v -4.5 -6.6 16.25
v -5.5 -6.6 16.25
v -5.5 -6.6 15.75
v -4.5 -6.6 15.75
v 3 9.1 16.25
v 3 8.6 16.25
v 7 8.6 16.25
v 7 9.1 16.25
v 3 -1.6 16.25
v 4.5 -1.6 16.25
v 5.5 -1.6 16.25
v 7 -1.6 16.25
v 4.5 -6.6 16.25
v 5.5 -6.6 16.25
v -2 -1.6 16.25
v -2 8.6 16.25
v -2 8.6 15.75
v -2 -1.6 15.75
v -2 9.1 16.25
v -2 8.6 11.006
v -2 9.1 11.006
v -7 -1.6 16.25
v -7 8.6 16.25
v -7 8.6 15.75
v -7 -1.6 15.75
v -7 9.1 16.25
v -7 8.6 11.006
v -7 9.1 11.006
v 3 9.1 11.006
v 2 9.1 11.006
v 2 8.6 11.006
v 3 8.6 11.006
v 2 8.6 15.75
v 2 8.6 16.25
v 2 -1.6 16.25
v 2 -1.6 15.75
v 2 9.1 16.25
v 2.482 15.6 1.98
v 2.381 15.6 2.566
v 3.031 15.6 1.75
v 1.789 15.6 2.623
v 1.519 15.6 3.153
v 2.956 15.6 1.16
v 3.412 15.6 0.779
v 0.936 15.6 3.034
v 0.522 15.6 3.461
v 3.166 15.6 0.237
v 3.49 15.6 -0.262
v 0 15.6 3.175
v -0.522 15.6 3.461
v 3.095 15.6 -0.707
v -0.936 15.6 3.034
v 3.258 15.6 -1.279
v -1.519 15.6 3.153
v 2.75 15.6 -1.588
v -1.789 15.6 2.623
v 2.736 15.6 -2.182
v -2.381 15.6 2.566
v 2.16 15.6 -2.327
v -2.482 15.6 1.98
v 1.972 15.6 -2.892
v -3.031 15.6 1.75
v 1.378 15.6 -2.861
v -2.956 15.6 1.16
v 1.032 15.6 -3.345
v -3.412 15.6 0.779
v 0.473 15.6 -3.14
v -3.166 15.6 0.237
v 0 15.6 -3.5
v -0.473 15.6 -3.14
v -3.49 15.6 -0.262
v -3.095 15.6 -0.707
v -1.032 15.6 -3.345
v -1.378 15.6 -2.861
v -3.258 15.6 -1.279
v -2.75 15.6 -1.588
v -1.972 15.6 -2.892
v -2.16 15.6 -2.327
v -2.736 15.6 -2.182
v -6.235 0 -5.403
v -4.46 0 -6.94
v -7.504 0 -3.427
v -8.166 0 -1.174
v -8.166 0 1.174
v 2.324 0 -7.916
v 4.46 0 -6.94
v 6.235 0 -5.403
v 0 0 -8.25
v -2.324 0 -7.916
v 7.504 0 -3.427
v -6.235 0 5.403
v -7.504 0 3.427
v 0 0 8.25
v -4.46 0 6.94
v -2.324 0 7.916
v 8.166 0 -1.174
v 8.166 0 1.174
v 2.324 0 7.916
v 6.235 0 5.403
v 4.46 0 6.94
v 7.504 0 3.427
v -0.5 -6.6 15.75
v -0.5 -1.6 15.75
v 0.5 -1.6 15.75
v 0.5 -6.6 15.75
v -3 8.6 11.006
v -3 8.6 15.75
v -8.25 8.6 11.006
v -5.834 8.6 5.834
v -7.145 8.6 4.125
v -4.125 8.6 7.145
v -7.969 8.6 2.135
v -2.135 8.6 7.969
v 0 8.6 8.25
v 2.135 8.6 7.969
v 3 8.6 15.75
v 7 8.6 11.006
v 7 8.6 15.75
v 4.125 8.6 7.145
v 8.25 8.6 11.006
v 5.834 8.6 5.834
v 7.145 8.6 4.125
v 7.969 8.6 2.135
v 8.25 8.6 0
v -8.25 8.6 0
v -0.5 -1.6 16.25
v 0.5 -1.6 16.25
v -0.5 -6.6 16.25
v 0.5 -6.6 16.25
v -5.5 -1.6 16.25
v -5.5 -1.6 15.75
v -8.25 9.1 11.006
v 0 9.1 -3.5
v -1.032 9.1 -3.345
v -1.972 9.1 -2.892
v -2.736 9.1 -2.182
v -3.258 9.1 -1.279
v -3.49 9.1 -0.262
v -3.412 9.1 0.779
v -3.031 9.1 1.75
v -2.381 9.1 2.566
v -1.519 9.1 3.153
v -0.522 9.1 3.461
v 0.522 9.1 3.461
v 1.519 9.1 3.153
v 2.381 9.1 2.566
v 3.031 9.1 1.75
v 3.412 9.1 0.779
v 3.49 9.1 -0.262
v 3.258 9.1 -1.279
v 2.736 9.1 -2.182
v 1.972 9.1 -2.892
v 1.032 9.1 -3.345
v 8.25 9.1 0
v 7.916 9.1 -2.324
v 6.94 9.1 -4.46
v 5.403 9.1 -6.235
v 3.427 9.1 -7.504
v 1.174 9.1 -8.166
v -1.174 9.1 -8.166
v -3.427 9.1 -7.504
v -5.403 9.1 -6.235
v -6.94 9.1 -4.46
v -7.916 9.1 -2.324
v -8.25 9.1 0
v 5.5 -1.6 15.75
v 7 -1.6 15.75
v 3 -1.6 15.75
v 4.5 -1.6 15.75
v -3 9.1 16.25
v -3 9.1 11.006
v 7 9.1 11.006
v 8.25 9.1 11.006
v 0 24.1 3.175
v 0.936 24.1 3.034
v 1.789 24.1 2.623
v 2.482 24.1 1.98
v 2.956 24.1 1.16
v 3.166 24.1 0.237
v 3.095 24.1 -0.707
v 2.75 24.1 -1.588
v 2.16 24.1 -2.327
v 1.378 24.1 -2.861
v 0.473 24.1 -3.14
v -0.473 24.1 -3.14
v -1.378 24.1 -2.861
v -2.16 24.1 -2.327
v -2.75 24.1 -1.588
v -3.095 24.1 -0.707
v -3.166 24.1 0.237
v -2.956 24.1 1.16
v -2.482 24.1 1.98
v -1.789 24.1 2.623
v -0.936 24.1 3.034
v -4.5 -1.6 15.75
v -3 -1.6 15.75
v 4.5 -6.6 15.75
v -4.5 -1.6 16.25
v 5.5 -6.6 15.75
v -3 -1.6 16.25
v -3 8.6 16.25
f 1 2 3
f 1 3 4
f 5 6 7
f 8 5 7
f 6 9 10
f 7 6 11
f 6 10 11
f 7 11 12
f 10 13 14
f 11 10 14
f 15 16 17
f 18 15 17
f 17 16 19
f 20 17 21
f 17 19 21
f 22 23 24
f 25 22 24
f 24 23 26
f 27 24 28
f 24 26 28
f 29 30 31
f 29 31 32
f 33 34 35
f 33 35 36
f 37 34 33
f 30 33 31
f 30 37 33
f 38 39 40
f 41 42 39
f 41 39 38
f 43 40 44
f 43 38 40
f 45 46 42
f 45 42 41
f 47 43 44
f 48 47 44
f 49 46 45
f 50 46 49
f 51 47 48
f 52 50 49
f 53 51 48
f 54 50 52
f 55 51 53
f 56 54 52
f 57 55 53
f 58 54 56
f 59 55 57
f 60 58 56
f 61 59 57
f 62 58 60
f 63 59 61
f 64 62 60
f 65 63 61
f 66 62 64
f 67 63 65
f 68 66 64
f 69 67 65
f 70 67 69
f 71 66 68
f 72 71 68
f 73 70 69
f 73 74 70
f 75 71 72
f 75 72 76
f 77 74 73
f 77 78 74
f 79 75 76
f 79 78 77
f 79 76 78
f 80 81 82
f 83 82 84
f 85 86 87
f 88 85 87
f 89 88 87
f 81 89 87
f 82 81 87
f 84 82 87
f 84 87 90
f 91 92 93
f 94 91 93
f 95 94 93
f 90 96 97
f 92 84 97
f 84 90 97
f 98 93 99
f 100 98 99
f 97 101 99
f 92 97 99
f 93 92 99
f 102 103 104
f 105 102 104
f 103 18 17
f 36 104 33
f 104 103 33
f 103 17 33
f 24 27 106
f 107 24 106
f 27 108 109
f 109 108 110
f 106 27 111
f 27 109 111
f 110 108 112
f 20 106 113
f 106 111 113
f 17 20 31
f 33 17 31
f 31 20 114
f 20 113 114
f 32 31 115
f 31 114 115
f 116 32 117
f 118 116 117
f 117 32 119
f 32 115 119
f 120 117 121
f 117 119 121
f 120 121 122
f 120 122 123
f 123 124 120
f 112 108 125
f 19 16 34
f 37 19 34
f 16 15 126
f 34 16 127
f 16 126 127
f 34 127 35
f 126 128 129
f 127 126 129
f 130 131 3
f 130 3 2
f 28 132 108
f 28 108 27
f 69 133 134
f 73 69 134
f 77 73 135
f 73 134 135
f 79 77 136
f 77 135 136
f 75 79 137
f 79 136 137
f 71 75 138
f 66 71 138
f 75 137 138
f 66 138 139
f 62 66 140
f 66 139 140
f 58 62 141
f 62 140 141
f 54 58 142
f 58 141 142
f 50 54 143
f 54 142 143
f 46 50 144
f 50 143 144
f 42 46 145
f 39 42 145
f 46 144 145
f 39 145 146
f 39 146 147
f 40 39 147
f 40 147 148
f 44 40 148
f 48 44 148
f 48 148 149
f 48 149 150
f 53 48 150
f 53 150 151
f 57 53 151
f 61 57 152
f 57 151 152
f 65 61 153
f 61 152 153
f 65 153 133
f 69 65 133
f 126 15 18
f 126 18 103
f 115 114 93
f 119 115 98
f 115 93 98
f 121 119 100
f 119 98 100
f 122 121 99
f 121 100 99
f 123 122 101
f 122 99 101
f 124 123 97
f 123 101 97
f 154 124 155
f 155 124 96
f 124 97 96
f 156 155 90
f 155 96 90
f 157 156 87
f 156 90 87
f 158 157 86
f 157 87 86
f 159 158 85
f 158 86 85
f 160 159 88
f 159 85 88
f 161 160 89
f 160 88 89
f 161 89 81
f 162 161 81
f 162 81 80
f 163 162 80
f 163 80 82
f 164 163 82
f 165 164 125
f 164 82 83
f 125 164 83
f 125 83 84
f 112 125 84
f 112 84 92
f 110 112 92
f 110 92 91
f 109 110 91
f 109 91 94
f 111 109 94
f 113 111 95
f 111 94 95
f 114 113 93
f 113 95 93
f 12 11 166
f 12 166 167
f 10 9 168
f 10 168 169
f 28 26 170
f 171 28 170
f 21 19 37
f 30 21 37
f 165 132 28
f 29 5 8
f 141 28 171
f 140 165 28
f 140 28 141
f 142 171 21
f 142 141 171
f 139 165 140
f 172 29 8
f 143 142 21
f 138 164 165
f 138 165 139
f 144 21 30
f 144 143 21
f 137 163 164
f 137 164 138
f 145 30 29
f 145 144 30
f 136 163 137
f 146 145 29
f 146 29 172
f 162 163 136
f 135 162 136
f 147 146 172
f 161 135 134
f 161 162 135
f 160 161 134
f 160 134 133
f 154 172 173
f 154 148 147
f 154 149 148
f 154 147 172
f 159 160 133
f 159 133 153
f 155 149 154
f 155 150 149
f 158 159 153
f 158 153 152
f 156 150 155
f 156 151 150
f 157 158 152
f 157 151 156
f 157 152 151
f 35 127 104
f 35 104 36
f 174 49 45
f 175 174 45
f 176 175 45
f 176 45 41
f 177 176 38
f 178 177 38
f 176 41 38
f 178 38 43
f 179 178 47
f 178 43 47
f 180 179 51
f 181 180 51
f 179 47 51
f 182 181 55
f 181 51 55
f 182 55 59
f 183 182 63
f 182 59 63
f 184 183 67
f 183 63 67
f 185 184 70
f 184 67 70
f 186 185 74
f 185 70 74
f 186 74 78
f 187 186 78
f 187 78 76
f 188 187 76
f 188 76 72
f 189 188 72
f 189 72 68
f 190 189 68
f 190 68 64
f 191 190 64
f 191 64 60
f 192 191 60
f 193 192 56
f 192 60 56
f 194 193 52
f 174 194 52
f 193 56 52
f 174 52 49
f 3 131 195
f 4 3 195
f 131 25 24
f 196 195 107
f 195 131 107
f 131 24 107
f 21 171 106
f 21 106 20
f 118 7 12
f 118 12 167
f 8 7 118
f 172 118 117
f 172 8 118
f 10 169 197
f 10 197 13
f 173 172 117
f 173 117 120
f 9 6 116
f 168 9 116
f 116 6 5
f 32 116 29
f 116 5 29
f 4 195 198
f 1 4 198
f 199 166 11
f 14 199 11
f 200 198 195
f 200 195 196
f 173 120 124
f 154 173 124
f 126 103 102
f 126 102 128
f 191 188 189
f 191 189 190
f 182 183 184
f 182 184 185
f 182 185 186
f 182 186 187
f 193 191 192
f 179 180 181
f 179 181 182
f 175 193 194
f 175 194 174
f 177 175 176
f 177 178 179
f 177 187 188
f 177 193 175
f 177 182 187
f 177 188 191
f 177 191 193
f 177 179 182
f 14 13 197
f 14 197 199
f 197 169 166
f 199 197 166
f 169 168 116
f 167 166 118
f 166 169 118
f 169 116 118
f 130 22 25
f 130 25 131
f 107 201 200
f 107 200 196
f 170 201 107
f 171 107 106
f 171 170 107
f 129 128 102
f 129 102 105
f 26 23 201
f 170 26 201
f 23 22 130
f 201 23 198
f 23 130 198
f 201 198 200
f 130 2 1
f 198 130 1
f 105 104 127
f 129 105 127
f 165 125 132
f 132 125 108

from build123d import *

# Parameters (mm, degrees)
SKETCH1_R           = 8.25
BOSS_EXTRUDE1_DEPTH = 9.1
SKETCH2_R           = 3.5
BOSS_EXTRUDE2_DEPTH = 6.5
SKETCH3_R           = 3.175
BOSS_EXTRUDE3_DEPTH = 8.5
BOSS_EXTRUDE4_START = -0.5
BOSS_EXTRUDE4_DEPTH = 0.5
SKETCH5_W           = 4
SKETCH5_H           = 0.5
BOSS_EXTRUDE5_DEPTH = 10.2
SKETCH6_W           = 1
SKETCH6_H           = 0.5
BOSS_EXTRUDE6_DEPTH = 5
CUT_EXTRUDE1_REACH  = 26.054
SKETCH7_W           = 1.25
SKETCH7_H           = 5.244370441
SKETCH7_W_2         = 1


with BuildPart() as part:
    # Sketch1 → Boss-Extrude1 (new body)
    with BuildSketch(Plane(origin=(0, 0, 0), x_dir=(1, 0, 0), z_dir=(0, 1, 0))):
        with Locations(Location((0, 0, 0), (0, 0, 270))):
            Circle(SKETCH1_R)
    extrude(amount=BOSS_EXTRUDE1_DEPTH)

    # Sketch2 → Boss-Extrude2 (add)
    with BuildSketch(Plane(origin=(0, 9.1, 0), x_dir=(1, 0, 0), z_dir=(0, 1, 0))):
        with Locations(Location((0, 0, 0), (0, 0, 90))):
            Circle(SKETCH2_R)
    extrude(amount=BOSS_EXTRUDE2_DEPTH)

    # Sketch3 → Boss-Extrude3 (add)
    with BuildSketch(Plane(origin=(0, 15.6, 0), x_dir=(1, 0, 0), z_dir=(0, 1, 0))):
        with Locations(Location((0, 0, 0), (0, 0, 270))):
            Circle(SKETCH3_R)
    extrude(amount=BOSS_EXTRUDE3_DEPTH)

    # Sketch4 → Boss-Extrude4 (add)
    with BuildSketch(Plane(origin=(0, 9.1, 0), x_dir=(1, 0, 0), z_dir=(0, 1, 0)).offset(BOSS_EXTRUDE4_START)):
        with BuildLine():
            Line((-8.25, 0), (-8.25, -16.25))
            Line((-8.25, -16.25), (8.25, -16.25))
            Line((8.25, -16.25), (8.25, 0))
            ThreePointArc((8.25, 0), (0, -8.25), (-8.25, 0))
        make_face()
    extrude(amount=BOSS_EXTRUDE4_DEPTH)

    # Sketch5 → Boss-Extrude5 (add)
    with BuildSketch(Plane.XZ.offset(-8.6)):
        with Locations((0, 16)):
            Rectangle(SKETCH5_W, SKETCH5_H)
        with Locations((-5, 16)):
            Rectangle(SKETCH5_W, SKETCH5_H)
        with Locations((5, 16)):
            Rectangle(SKETCH5_W, SKETCH5_H)
    extrude(amount=BOSS_EXTRUDE5_DEPTH)

    # Sketch6 → Boss-Extrude6 (add)
    with BuildSketch(Plane.XZ.offset(1.6)):
        with Locations((5, 16)):
            Rectangle(SKETCH6_W, SKETCH6_H)
        with Locations((0, 16)):
            Rectangle(SKETCH6_W, SKETCH6_H)
        with Locations((-5, 16)):
            Rectangle(SKETCH6_W, SKETCH6_H)
    extrude(amount=BOSS_EXTRUDE6_DEPTH)

    # Sketch7 → Cut-Extrude1 (cut, up to next)
    with BuildSketch(Plane(origin=(0, 9.1, 0), x_dir=(1, 0, 0), z_dir=(0, 1, 0)), mode=Mode.PRIVATE) as cut_extrude1_sk1:
        with Locations((-7.625, -13.627814779)):
            Rectangle(SKETCH7_W, SKETCH7_H)
    cut_extrude1_tool1 = extrude(cut_extrude1_sk1.sketch, amount=-CUT_EXTRUDE1_REACH, mode=Mode.PRIVATE) & part.part
    # Sketch7 → Cut-Extrude1 (cut, up to next)
    with BuildSketch(Plane(origin=(0, 9.1, 0), x_dir=(1, 0, 0), z_dir=(0, 1, 0)), mode=Mode.PRIVATE) as cut_extrude1_sk2:
        with Locations((7.625, -13.627814779)):
            Rectangle(SKETCH7_W, SKETCH7_H)
    cut_extrude1_tool2 = extrude(cut_extrude1_sk2.sketch, amount=-CUT_EXTRUDE1_REACH, mode=Mode.PRIVATE) & part.part
    # Sketch7 → Cut-Extrude1 (cut, up to next)
    with BuildSketch(Plane(origin=(0, 9.1, 0), x_dir=(1, 0, 0), z_dir=(0, 1, 0)), mode=Mode.PRIVATE) as cut_extrude1_sk3:
        with Locations((2.5, -13.627814779)):
            Rectangle(SKETCH7_W_2, SKETCH7_H)
    cut_extrude1_tool3 = extrude(cut_extrude1_sk3.sketch, amount=-CUT_EXTRUDE1_REACH, mode=Mode.PRIVATE) & part.part
    # Sketch7 → Cut-Extrude1 (cut, up to next)
    with BuildSketch(Plane(origin=(0, 9.1, 0), x_dir=(1, 0, 0), z_dir=(0, 1, 0)), mode=Mode.PRIVATE) as cut_extrude1_sk4:
        with Locations((-2.5, -13.627814779)):
            Rectangle(SKETCH7_W_2, SKETCH7_H)
    cut_extrude1_tool4 = extrude(cut_extrude1_sk4.sketch, amount=-CUT_EXTRUDE1_REACH, mode=Mode.PRIVATE) & part.part
    add(cut_extrude1_tool1.solids().sort_by_distance((-7.625, 9.1, 13.627815))[0], mode=Mode.SUBTRACT)
    add(cut_extrude1_tool2.solids().sort_by_distance((7.625, 9.1, 13.627815))[0], mode=Mode.SUBTRACT)
    add(cut_extrude1_tool3.solids().sort_by_distance((2.5, 9.1, 13.627815))[0], mode=Mode.SUBTRACT)
    add(cut_extrude1_tool4.solids().sort_by_distance((-2.5, 9.1, 13.627815))[0], mode=Mode.SUBTRACT)


solid = part.part
